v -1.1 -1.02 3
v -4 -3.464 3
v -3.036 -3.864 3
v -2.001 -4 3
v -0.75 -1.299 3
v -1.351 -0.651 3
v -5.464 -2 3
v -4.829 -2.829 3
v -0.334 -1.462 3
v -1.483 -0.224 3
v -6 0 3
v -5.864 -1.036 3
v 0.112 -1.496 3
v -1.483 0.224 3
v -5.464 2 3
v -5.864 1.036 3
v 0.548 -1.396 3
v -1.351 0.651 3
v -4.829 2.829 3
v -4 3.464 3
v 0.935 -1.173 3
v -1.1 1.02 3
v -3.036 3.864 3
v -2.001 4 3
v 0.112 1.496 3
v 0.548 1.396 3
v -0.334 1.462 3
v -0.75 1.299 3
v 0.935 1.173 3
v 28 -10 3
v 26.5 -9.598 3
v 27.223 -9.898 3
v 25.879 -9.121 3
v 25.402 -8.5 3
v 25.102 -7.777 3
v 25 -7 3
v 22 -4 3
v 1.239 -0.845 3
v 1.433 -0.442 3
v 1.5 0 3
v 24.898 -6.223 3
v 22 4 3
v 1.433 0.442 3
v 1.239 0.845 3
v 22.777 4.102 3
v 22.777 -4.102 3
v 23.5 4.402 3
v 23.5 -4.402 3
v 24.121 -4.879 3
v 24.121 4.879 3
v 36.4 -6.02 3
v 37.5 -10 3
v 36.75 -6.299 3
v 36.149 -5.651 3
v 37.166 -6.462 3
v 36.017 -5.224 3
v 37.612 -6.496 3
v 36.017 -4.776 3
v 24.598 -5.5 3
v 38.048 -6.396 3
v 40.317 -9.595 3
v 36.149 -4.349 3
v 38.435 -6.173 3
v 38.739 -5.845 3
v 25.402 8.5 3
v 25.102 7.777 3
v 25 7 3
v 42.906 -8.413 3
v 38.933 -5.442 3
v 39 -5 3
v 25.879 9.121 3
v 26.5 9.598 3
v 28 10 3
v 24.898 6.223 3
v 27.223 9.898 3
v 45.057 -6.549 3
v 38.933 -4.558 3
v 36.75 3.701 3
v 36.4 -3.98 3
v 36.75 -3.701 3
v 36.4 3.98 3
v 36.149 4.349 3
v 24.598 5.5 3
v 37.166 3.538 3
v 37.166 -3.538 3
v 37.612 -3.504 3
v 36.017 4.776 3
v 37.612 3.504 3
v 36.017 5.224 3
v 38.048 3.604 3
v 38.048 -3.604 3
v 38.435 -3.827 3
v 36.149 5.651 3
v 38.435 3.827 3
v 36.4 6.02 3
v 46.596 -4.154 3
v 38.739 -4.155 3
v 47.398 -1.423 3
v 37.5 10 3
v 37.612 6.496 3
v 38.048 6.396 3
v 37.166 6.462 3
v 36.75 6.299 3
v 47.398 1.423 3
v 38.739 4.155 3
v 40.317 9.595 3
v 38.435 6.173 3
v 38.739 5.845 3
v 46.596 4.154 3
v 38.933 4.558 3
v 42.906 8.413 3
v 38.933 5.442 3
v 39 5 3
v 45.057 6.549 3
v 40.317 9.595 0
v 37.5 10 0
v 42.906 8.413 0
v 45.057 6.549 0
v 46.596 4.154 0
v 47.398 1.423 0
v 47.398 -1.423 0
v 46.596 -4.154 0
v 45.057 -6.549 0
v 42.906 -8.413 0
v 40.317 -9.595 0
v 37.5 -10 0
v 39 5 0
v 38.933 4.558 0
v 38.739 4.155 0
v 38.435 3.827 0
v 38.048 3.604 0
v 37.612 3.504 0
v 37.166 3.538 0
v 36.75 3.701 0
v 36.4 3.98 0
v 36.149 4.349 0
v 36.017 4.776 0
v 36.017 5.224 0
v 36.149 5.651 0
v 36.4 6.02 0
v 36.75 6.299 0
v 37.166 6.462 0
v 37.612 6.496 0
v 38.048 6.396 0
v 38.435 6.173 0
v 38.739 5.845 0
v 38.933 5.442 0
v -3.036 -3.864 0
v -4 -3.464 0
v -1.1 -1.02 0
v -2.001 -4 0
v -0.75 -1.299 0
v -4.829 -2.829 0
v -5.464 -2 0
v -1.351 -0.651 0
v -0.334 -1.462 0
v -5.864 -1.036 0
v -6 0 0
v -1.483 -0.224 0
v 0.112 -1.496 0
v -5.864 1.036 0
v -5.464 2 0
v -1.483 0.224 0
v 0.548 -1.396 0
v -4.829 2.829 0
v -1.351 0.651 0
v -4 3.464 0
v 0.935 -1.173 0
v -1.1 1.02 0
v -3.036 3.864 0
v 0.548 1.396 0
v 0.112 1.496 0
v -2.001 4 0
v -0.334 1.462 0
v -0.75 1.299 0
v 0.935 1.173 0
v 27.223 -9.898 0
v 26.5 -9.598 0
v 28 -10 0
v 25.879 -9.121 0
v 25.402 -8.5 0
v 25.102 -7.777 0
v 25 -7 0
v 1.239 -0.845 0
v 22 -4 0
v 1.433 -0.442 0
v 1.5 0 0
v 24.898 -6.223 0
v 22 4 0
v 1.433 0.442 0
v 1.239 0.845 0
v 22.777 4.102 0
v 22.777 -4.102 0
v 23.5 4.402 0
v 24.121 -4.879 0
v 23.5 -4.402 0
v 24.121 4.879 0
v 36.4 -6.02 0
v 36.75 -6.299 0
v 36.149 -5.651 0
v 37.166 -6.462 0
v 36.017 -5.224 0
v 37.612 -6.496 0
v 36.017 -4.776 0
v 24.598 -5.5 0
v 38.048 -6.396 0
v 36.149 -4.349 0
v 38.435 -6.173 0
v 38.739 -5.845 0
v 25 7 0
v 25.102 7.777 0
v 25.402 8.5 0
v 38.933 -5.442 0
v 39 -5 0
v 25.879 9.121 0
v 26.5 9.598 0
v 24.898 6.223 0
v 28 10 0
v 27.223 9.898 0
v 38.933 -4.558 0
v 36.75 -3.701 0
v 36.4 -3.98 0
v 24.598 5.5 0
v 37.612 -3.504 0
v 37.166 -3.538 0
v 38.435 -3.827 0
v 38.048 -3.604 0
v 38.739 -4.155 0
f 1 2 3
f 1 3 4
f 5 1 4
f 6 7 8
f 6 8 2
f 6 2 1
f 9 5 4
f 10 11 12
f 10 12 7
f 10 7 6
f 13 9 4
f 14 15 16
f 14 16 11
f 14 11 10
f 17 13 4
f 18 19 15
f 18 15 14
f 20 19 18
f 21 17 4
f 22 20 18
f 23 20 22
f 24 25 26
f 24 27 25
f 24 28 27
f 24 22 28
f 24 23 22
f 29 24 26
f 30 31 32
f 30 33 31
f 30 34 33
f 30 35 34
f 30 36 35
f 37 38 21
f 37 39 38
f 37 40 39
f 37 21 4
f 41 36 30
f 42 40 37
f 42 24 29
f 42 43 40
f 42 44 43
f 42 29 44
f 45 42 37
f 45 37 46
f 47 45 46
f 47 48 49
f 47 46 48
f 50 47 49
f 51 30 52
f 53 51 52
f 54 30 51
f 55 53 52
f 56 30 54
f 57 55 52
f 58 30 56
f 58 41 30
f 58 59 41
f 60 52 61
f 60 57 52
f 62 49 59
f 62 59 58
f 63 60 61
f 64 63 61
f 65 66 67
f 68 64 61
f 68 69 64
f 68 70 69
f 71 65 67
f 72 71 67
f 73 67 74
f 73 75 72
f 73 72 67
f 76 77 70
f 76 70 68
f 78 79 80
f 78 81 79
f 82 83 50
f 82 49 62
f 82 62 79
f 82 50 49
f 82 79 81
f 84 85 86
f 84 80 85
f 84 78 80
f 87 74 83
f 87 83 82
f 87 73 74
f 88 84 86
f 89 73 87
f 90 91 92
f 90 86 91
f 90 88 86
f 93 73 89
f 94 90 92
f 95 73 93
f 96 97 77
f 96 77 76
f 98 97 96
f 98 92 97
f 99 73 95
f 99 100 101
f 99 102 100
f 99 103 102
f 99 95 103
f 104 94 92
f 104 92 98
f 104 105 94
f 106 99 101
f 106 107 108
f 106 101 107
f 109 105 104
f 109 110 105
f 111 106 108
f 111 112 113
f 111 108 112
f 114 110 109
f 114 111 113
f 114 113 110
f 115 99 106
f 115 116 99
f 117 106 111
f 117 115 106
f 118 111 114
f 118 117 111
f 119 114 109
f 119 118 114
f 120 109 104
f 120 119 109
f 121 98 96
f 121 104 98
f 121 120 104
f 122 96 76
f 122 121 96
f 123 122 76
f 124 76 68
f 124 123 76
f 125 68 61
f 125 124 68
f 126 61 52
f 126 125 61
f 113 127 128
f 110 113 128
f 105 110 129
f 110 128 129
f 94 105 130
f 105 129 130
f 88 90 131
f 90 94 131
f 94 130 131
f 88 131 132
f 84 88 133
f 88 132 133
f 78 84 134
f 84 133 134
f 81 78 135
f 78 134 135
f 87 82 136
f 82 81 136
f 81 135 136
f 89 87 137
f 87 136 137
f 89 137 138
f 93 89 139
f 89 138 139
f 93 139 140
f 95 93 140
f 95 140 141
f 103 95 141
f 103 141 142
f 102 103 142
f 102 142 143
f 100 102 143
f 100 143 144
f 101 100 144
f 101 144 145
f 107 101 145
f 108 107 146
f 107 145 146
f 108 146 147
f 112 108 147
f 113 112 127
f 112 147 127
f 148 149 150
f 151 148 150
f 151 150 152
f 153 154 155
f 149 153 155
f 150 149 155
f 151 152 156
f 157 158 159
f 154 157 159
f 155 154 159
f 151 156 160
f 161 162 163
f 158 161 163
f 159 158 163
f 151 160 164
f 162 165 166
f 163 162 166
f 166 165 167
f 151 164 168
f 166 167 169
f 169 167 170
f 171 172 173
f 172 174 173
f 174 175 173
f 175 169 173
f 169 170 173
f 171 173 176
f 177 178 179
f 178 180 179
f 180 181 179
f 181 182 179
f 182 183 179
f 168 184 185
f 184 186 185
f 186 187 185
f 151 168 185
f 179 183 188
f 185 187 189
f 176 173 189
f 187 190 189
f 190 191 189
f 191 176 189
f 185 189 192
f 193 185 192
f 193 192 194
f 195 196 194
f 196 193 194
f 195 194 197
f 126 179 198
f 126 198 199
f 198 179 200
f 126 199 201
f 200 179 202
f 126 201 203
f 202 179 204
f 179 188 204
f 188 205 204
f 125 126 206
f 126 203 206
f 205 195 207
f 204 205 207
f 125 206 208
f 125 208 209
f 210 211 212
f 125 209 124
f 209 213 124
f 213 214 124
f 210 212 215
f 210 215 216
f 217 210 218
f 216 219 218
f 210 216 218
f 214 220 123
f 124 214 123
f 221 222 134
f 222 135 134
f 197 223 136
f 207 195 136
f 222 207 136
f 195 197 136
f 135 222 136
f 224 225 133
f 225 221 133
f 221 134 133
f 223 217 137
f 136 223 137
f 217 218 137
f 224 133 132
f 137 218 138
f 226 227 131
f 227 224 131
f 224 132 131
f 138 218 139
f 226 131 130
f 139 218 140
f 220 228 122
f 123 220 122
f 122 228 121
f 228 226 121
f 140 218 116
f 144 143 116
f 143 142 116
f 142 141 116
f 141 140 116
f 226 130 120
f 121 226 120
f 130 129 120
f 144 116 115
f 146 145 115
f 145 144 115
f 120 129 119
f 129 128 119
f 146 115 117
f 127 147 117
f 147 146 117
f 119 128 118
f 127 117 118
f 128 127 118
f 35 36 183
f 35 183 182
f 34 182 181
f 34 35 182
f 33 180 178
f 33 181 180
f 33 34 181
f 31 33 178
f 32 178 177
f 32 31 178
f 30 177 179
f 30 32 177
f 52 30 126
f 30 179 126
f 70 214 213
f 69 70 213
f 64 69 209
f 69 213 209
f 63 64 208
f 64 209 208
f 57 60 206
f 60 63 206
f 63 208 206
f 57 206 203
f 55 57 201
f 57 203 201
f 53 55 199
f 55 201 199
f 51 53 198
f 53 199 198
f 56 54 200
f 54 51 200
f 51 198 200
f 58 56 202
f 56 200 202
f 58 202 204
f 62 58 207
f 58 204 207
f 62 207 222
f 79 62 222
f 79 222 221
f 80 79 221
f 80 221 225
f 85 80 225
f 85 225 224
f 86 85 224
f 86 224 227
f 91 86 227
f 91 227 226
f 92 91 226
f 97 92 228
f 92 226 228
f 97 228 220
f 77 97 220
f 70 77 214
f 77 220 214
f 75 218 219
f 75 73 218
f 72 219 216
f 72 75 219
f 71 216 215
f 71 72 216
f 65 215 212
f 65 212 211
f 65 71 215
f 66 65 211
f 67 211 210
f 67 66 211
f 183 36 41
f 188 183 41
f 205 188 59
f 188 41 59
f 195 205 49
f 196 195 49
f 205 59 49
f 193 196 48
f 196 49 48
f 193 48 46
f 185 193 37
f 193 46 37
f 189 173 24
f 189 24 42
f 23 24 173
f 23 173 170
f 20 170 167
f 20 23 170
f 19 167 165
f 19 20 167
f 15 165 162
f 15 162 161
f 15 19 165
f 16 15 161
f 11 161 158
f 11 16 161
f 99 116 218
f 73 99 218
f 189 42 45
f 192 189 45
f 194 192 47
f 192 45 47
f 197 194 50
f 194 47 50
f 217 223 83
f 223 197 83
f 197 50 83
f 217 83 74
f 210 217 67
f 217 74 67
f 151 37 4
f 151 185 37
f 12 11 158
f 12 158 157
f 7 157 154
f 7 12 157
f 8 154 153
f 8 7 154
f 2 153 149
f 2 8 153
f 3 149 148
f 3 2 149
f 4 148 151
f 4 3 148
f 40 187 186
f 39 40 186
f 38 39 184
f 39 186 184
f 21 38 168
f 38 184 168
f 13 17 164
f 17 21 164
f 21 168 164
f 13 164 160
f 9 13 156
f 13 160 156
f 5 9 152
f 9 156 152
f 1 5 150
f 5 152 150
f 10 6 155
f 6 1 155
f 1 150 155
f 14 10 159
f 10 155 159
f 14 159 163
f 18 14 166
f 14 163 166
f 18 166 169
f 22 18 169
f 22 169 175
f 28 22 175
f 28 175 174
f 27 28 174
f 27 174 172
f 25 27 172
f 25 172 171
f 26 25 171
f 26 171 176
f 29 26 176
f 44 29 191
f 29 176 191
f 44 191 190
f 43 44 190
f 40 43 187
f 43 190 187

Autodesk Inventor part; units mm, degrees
ref_plane "YZ Plane" through (0, 0, 0) normal (1, 0, 0) x (0, 1, 0)
ref_plane "XZ Plane" through (0, 0, 0) normal (0, 1, 0) x (-1, 0, 0)
ref_plane "XY Plane" through (0, 0, 0) normal (0, 0, 1) x (1, 0, 0)
sketch "Sketch1" plane through (0, 0, 0) normal (0, 0, 1) x (1, 0, 0)
  line L0 (0, 0) -> (37.5, 0) construction
  line L1 (0, -10) -> (37.5, -10)
  line L2 (37.5, 10) -> (0, 10)
  arc A0 (0, 10) -> (0, -10) centre (0, 0) ccw
  arc A1 (37.5, -10) -> (37.5, 10) centre (37.5, 0) ccw
  line L3 (0, 0) -> (37.5, 0) construction
  circle A2 centre (0, 0) radius 1.5
  circle A3 centre (37.5, -5) radius 1.5
  circle A4 centre (37.5, 5) radius 1.5
  point P0 (18.75, 0)
  dimension "d0" = 37.5
  dimension "d1" = 0
  dimension "d2" = 20
  dimension "d3" = 3
  dimension "d4" = 3
  dimension "d5" = 3
  dimension "d6" = 10
  dimension "d7" = 5
  dimension "d8" = 0
  dimension "d9" = 0
extrude "Extrusion1" add sketch "Sketch1" along normal blind 3
sketch "Sketch2" plane through (0, 0, 0) normal (0, 0, -1) x (-1, 0, 0)
  line L0 (6, 4) -> (-25, 4)
  line L1 (-25, 10) -> (-25, -10)
  line L2 (-25, -4) -> (6, -4)
  line L3 (6, -4) -> (6, 4)
  arc A0 (-37.5, 10) -> (-37.5, -10) centre (-37.5, 0) ccw projected
  line L4 (0, -10) -> (-37.5, -10) projected
  arc A1 (0, -10) -> (0, 10) centre (0, 0) ccw projected
  line L5 (-37.5, 10) -> (0, 10) projected
  circle A2 centre (-37.5, 5) radius 1.5 projected
  circle A3 centre (-37.5, -5) radius 1.5 projected
  circle A4 centre (0, 0) radius 1.5 projected
  dimension "d12" = 6
  dimension "d13" = 4
  dimension "d14" = 4
  dimension "d15" = 25
extrude "Extrusion2" cut sketch "Sketch2" against normal up to surface (3 mm away) contours L0 L1 L5 A1 L4 L2 L3
fillet "Fillet1" radius 3 4 edges at (25, 4, 1.5) (25, 10, 1.5) (25, -4, 1.5) (25, -10, 1.5)
fillet "Fillet2" radius 4 2 edges at (-6, 4, 1.5) (-6, -4, 1.5)
properties part number "Arm5" material "Aluminum 6061, Welded"
